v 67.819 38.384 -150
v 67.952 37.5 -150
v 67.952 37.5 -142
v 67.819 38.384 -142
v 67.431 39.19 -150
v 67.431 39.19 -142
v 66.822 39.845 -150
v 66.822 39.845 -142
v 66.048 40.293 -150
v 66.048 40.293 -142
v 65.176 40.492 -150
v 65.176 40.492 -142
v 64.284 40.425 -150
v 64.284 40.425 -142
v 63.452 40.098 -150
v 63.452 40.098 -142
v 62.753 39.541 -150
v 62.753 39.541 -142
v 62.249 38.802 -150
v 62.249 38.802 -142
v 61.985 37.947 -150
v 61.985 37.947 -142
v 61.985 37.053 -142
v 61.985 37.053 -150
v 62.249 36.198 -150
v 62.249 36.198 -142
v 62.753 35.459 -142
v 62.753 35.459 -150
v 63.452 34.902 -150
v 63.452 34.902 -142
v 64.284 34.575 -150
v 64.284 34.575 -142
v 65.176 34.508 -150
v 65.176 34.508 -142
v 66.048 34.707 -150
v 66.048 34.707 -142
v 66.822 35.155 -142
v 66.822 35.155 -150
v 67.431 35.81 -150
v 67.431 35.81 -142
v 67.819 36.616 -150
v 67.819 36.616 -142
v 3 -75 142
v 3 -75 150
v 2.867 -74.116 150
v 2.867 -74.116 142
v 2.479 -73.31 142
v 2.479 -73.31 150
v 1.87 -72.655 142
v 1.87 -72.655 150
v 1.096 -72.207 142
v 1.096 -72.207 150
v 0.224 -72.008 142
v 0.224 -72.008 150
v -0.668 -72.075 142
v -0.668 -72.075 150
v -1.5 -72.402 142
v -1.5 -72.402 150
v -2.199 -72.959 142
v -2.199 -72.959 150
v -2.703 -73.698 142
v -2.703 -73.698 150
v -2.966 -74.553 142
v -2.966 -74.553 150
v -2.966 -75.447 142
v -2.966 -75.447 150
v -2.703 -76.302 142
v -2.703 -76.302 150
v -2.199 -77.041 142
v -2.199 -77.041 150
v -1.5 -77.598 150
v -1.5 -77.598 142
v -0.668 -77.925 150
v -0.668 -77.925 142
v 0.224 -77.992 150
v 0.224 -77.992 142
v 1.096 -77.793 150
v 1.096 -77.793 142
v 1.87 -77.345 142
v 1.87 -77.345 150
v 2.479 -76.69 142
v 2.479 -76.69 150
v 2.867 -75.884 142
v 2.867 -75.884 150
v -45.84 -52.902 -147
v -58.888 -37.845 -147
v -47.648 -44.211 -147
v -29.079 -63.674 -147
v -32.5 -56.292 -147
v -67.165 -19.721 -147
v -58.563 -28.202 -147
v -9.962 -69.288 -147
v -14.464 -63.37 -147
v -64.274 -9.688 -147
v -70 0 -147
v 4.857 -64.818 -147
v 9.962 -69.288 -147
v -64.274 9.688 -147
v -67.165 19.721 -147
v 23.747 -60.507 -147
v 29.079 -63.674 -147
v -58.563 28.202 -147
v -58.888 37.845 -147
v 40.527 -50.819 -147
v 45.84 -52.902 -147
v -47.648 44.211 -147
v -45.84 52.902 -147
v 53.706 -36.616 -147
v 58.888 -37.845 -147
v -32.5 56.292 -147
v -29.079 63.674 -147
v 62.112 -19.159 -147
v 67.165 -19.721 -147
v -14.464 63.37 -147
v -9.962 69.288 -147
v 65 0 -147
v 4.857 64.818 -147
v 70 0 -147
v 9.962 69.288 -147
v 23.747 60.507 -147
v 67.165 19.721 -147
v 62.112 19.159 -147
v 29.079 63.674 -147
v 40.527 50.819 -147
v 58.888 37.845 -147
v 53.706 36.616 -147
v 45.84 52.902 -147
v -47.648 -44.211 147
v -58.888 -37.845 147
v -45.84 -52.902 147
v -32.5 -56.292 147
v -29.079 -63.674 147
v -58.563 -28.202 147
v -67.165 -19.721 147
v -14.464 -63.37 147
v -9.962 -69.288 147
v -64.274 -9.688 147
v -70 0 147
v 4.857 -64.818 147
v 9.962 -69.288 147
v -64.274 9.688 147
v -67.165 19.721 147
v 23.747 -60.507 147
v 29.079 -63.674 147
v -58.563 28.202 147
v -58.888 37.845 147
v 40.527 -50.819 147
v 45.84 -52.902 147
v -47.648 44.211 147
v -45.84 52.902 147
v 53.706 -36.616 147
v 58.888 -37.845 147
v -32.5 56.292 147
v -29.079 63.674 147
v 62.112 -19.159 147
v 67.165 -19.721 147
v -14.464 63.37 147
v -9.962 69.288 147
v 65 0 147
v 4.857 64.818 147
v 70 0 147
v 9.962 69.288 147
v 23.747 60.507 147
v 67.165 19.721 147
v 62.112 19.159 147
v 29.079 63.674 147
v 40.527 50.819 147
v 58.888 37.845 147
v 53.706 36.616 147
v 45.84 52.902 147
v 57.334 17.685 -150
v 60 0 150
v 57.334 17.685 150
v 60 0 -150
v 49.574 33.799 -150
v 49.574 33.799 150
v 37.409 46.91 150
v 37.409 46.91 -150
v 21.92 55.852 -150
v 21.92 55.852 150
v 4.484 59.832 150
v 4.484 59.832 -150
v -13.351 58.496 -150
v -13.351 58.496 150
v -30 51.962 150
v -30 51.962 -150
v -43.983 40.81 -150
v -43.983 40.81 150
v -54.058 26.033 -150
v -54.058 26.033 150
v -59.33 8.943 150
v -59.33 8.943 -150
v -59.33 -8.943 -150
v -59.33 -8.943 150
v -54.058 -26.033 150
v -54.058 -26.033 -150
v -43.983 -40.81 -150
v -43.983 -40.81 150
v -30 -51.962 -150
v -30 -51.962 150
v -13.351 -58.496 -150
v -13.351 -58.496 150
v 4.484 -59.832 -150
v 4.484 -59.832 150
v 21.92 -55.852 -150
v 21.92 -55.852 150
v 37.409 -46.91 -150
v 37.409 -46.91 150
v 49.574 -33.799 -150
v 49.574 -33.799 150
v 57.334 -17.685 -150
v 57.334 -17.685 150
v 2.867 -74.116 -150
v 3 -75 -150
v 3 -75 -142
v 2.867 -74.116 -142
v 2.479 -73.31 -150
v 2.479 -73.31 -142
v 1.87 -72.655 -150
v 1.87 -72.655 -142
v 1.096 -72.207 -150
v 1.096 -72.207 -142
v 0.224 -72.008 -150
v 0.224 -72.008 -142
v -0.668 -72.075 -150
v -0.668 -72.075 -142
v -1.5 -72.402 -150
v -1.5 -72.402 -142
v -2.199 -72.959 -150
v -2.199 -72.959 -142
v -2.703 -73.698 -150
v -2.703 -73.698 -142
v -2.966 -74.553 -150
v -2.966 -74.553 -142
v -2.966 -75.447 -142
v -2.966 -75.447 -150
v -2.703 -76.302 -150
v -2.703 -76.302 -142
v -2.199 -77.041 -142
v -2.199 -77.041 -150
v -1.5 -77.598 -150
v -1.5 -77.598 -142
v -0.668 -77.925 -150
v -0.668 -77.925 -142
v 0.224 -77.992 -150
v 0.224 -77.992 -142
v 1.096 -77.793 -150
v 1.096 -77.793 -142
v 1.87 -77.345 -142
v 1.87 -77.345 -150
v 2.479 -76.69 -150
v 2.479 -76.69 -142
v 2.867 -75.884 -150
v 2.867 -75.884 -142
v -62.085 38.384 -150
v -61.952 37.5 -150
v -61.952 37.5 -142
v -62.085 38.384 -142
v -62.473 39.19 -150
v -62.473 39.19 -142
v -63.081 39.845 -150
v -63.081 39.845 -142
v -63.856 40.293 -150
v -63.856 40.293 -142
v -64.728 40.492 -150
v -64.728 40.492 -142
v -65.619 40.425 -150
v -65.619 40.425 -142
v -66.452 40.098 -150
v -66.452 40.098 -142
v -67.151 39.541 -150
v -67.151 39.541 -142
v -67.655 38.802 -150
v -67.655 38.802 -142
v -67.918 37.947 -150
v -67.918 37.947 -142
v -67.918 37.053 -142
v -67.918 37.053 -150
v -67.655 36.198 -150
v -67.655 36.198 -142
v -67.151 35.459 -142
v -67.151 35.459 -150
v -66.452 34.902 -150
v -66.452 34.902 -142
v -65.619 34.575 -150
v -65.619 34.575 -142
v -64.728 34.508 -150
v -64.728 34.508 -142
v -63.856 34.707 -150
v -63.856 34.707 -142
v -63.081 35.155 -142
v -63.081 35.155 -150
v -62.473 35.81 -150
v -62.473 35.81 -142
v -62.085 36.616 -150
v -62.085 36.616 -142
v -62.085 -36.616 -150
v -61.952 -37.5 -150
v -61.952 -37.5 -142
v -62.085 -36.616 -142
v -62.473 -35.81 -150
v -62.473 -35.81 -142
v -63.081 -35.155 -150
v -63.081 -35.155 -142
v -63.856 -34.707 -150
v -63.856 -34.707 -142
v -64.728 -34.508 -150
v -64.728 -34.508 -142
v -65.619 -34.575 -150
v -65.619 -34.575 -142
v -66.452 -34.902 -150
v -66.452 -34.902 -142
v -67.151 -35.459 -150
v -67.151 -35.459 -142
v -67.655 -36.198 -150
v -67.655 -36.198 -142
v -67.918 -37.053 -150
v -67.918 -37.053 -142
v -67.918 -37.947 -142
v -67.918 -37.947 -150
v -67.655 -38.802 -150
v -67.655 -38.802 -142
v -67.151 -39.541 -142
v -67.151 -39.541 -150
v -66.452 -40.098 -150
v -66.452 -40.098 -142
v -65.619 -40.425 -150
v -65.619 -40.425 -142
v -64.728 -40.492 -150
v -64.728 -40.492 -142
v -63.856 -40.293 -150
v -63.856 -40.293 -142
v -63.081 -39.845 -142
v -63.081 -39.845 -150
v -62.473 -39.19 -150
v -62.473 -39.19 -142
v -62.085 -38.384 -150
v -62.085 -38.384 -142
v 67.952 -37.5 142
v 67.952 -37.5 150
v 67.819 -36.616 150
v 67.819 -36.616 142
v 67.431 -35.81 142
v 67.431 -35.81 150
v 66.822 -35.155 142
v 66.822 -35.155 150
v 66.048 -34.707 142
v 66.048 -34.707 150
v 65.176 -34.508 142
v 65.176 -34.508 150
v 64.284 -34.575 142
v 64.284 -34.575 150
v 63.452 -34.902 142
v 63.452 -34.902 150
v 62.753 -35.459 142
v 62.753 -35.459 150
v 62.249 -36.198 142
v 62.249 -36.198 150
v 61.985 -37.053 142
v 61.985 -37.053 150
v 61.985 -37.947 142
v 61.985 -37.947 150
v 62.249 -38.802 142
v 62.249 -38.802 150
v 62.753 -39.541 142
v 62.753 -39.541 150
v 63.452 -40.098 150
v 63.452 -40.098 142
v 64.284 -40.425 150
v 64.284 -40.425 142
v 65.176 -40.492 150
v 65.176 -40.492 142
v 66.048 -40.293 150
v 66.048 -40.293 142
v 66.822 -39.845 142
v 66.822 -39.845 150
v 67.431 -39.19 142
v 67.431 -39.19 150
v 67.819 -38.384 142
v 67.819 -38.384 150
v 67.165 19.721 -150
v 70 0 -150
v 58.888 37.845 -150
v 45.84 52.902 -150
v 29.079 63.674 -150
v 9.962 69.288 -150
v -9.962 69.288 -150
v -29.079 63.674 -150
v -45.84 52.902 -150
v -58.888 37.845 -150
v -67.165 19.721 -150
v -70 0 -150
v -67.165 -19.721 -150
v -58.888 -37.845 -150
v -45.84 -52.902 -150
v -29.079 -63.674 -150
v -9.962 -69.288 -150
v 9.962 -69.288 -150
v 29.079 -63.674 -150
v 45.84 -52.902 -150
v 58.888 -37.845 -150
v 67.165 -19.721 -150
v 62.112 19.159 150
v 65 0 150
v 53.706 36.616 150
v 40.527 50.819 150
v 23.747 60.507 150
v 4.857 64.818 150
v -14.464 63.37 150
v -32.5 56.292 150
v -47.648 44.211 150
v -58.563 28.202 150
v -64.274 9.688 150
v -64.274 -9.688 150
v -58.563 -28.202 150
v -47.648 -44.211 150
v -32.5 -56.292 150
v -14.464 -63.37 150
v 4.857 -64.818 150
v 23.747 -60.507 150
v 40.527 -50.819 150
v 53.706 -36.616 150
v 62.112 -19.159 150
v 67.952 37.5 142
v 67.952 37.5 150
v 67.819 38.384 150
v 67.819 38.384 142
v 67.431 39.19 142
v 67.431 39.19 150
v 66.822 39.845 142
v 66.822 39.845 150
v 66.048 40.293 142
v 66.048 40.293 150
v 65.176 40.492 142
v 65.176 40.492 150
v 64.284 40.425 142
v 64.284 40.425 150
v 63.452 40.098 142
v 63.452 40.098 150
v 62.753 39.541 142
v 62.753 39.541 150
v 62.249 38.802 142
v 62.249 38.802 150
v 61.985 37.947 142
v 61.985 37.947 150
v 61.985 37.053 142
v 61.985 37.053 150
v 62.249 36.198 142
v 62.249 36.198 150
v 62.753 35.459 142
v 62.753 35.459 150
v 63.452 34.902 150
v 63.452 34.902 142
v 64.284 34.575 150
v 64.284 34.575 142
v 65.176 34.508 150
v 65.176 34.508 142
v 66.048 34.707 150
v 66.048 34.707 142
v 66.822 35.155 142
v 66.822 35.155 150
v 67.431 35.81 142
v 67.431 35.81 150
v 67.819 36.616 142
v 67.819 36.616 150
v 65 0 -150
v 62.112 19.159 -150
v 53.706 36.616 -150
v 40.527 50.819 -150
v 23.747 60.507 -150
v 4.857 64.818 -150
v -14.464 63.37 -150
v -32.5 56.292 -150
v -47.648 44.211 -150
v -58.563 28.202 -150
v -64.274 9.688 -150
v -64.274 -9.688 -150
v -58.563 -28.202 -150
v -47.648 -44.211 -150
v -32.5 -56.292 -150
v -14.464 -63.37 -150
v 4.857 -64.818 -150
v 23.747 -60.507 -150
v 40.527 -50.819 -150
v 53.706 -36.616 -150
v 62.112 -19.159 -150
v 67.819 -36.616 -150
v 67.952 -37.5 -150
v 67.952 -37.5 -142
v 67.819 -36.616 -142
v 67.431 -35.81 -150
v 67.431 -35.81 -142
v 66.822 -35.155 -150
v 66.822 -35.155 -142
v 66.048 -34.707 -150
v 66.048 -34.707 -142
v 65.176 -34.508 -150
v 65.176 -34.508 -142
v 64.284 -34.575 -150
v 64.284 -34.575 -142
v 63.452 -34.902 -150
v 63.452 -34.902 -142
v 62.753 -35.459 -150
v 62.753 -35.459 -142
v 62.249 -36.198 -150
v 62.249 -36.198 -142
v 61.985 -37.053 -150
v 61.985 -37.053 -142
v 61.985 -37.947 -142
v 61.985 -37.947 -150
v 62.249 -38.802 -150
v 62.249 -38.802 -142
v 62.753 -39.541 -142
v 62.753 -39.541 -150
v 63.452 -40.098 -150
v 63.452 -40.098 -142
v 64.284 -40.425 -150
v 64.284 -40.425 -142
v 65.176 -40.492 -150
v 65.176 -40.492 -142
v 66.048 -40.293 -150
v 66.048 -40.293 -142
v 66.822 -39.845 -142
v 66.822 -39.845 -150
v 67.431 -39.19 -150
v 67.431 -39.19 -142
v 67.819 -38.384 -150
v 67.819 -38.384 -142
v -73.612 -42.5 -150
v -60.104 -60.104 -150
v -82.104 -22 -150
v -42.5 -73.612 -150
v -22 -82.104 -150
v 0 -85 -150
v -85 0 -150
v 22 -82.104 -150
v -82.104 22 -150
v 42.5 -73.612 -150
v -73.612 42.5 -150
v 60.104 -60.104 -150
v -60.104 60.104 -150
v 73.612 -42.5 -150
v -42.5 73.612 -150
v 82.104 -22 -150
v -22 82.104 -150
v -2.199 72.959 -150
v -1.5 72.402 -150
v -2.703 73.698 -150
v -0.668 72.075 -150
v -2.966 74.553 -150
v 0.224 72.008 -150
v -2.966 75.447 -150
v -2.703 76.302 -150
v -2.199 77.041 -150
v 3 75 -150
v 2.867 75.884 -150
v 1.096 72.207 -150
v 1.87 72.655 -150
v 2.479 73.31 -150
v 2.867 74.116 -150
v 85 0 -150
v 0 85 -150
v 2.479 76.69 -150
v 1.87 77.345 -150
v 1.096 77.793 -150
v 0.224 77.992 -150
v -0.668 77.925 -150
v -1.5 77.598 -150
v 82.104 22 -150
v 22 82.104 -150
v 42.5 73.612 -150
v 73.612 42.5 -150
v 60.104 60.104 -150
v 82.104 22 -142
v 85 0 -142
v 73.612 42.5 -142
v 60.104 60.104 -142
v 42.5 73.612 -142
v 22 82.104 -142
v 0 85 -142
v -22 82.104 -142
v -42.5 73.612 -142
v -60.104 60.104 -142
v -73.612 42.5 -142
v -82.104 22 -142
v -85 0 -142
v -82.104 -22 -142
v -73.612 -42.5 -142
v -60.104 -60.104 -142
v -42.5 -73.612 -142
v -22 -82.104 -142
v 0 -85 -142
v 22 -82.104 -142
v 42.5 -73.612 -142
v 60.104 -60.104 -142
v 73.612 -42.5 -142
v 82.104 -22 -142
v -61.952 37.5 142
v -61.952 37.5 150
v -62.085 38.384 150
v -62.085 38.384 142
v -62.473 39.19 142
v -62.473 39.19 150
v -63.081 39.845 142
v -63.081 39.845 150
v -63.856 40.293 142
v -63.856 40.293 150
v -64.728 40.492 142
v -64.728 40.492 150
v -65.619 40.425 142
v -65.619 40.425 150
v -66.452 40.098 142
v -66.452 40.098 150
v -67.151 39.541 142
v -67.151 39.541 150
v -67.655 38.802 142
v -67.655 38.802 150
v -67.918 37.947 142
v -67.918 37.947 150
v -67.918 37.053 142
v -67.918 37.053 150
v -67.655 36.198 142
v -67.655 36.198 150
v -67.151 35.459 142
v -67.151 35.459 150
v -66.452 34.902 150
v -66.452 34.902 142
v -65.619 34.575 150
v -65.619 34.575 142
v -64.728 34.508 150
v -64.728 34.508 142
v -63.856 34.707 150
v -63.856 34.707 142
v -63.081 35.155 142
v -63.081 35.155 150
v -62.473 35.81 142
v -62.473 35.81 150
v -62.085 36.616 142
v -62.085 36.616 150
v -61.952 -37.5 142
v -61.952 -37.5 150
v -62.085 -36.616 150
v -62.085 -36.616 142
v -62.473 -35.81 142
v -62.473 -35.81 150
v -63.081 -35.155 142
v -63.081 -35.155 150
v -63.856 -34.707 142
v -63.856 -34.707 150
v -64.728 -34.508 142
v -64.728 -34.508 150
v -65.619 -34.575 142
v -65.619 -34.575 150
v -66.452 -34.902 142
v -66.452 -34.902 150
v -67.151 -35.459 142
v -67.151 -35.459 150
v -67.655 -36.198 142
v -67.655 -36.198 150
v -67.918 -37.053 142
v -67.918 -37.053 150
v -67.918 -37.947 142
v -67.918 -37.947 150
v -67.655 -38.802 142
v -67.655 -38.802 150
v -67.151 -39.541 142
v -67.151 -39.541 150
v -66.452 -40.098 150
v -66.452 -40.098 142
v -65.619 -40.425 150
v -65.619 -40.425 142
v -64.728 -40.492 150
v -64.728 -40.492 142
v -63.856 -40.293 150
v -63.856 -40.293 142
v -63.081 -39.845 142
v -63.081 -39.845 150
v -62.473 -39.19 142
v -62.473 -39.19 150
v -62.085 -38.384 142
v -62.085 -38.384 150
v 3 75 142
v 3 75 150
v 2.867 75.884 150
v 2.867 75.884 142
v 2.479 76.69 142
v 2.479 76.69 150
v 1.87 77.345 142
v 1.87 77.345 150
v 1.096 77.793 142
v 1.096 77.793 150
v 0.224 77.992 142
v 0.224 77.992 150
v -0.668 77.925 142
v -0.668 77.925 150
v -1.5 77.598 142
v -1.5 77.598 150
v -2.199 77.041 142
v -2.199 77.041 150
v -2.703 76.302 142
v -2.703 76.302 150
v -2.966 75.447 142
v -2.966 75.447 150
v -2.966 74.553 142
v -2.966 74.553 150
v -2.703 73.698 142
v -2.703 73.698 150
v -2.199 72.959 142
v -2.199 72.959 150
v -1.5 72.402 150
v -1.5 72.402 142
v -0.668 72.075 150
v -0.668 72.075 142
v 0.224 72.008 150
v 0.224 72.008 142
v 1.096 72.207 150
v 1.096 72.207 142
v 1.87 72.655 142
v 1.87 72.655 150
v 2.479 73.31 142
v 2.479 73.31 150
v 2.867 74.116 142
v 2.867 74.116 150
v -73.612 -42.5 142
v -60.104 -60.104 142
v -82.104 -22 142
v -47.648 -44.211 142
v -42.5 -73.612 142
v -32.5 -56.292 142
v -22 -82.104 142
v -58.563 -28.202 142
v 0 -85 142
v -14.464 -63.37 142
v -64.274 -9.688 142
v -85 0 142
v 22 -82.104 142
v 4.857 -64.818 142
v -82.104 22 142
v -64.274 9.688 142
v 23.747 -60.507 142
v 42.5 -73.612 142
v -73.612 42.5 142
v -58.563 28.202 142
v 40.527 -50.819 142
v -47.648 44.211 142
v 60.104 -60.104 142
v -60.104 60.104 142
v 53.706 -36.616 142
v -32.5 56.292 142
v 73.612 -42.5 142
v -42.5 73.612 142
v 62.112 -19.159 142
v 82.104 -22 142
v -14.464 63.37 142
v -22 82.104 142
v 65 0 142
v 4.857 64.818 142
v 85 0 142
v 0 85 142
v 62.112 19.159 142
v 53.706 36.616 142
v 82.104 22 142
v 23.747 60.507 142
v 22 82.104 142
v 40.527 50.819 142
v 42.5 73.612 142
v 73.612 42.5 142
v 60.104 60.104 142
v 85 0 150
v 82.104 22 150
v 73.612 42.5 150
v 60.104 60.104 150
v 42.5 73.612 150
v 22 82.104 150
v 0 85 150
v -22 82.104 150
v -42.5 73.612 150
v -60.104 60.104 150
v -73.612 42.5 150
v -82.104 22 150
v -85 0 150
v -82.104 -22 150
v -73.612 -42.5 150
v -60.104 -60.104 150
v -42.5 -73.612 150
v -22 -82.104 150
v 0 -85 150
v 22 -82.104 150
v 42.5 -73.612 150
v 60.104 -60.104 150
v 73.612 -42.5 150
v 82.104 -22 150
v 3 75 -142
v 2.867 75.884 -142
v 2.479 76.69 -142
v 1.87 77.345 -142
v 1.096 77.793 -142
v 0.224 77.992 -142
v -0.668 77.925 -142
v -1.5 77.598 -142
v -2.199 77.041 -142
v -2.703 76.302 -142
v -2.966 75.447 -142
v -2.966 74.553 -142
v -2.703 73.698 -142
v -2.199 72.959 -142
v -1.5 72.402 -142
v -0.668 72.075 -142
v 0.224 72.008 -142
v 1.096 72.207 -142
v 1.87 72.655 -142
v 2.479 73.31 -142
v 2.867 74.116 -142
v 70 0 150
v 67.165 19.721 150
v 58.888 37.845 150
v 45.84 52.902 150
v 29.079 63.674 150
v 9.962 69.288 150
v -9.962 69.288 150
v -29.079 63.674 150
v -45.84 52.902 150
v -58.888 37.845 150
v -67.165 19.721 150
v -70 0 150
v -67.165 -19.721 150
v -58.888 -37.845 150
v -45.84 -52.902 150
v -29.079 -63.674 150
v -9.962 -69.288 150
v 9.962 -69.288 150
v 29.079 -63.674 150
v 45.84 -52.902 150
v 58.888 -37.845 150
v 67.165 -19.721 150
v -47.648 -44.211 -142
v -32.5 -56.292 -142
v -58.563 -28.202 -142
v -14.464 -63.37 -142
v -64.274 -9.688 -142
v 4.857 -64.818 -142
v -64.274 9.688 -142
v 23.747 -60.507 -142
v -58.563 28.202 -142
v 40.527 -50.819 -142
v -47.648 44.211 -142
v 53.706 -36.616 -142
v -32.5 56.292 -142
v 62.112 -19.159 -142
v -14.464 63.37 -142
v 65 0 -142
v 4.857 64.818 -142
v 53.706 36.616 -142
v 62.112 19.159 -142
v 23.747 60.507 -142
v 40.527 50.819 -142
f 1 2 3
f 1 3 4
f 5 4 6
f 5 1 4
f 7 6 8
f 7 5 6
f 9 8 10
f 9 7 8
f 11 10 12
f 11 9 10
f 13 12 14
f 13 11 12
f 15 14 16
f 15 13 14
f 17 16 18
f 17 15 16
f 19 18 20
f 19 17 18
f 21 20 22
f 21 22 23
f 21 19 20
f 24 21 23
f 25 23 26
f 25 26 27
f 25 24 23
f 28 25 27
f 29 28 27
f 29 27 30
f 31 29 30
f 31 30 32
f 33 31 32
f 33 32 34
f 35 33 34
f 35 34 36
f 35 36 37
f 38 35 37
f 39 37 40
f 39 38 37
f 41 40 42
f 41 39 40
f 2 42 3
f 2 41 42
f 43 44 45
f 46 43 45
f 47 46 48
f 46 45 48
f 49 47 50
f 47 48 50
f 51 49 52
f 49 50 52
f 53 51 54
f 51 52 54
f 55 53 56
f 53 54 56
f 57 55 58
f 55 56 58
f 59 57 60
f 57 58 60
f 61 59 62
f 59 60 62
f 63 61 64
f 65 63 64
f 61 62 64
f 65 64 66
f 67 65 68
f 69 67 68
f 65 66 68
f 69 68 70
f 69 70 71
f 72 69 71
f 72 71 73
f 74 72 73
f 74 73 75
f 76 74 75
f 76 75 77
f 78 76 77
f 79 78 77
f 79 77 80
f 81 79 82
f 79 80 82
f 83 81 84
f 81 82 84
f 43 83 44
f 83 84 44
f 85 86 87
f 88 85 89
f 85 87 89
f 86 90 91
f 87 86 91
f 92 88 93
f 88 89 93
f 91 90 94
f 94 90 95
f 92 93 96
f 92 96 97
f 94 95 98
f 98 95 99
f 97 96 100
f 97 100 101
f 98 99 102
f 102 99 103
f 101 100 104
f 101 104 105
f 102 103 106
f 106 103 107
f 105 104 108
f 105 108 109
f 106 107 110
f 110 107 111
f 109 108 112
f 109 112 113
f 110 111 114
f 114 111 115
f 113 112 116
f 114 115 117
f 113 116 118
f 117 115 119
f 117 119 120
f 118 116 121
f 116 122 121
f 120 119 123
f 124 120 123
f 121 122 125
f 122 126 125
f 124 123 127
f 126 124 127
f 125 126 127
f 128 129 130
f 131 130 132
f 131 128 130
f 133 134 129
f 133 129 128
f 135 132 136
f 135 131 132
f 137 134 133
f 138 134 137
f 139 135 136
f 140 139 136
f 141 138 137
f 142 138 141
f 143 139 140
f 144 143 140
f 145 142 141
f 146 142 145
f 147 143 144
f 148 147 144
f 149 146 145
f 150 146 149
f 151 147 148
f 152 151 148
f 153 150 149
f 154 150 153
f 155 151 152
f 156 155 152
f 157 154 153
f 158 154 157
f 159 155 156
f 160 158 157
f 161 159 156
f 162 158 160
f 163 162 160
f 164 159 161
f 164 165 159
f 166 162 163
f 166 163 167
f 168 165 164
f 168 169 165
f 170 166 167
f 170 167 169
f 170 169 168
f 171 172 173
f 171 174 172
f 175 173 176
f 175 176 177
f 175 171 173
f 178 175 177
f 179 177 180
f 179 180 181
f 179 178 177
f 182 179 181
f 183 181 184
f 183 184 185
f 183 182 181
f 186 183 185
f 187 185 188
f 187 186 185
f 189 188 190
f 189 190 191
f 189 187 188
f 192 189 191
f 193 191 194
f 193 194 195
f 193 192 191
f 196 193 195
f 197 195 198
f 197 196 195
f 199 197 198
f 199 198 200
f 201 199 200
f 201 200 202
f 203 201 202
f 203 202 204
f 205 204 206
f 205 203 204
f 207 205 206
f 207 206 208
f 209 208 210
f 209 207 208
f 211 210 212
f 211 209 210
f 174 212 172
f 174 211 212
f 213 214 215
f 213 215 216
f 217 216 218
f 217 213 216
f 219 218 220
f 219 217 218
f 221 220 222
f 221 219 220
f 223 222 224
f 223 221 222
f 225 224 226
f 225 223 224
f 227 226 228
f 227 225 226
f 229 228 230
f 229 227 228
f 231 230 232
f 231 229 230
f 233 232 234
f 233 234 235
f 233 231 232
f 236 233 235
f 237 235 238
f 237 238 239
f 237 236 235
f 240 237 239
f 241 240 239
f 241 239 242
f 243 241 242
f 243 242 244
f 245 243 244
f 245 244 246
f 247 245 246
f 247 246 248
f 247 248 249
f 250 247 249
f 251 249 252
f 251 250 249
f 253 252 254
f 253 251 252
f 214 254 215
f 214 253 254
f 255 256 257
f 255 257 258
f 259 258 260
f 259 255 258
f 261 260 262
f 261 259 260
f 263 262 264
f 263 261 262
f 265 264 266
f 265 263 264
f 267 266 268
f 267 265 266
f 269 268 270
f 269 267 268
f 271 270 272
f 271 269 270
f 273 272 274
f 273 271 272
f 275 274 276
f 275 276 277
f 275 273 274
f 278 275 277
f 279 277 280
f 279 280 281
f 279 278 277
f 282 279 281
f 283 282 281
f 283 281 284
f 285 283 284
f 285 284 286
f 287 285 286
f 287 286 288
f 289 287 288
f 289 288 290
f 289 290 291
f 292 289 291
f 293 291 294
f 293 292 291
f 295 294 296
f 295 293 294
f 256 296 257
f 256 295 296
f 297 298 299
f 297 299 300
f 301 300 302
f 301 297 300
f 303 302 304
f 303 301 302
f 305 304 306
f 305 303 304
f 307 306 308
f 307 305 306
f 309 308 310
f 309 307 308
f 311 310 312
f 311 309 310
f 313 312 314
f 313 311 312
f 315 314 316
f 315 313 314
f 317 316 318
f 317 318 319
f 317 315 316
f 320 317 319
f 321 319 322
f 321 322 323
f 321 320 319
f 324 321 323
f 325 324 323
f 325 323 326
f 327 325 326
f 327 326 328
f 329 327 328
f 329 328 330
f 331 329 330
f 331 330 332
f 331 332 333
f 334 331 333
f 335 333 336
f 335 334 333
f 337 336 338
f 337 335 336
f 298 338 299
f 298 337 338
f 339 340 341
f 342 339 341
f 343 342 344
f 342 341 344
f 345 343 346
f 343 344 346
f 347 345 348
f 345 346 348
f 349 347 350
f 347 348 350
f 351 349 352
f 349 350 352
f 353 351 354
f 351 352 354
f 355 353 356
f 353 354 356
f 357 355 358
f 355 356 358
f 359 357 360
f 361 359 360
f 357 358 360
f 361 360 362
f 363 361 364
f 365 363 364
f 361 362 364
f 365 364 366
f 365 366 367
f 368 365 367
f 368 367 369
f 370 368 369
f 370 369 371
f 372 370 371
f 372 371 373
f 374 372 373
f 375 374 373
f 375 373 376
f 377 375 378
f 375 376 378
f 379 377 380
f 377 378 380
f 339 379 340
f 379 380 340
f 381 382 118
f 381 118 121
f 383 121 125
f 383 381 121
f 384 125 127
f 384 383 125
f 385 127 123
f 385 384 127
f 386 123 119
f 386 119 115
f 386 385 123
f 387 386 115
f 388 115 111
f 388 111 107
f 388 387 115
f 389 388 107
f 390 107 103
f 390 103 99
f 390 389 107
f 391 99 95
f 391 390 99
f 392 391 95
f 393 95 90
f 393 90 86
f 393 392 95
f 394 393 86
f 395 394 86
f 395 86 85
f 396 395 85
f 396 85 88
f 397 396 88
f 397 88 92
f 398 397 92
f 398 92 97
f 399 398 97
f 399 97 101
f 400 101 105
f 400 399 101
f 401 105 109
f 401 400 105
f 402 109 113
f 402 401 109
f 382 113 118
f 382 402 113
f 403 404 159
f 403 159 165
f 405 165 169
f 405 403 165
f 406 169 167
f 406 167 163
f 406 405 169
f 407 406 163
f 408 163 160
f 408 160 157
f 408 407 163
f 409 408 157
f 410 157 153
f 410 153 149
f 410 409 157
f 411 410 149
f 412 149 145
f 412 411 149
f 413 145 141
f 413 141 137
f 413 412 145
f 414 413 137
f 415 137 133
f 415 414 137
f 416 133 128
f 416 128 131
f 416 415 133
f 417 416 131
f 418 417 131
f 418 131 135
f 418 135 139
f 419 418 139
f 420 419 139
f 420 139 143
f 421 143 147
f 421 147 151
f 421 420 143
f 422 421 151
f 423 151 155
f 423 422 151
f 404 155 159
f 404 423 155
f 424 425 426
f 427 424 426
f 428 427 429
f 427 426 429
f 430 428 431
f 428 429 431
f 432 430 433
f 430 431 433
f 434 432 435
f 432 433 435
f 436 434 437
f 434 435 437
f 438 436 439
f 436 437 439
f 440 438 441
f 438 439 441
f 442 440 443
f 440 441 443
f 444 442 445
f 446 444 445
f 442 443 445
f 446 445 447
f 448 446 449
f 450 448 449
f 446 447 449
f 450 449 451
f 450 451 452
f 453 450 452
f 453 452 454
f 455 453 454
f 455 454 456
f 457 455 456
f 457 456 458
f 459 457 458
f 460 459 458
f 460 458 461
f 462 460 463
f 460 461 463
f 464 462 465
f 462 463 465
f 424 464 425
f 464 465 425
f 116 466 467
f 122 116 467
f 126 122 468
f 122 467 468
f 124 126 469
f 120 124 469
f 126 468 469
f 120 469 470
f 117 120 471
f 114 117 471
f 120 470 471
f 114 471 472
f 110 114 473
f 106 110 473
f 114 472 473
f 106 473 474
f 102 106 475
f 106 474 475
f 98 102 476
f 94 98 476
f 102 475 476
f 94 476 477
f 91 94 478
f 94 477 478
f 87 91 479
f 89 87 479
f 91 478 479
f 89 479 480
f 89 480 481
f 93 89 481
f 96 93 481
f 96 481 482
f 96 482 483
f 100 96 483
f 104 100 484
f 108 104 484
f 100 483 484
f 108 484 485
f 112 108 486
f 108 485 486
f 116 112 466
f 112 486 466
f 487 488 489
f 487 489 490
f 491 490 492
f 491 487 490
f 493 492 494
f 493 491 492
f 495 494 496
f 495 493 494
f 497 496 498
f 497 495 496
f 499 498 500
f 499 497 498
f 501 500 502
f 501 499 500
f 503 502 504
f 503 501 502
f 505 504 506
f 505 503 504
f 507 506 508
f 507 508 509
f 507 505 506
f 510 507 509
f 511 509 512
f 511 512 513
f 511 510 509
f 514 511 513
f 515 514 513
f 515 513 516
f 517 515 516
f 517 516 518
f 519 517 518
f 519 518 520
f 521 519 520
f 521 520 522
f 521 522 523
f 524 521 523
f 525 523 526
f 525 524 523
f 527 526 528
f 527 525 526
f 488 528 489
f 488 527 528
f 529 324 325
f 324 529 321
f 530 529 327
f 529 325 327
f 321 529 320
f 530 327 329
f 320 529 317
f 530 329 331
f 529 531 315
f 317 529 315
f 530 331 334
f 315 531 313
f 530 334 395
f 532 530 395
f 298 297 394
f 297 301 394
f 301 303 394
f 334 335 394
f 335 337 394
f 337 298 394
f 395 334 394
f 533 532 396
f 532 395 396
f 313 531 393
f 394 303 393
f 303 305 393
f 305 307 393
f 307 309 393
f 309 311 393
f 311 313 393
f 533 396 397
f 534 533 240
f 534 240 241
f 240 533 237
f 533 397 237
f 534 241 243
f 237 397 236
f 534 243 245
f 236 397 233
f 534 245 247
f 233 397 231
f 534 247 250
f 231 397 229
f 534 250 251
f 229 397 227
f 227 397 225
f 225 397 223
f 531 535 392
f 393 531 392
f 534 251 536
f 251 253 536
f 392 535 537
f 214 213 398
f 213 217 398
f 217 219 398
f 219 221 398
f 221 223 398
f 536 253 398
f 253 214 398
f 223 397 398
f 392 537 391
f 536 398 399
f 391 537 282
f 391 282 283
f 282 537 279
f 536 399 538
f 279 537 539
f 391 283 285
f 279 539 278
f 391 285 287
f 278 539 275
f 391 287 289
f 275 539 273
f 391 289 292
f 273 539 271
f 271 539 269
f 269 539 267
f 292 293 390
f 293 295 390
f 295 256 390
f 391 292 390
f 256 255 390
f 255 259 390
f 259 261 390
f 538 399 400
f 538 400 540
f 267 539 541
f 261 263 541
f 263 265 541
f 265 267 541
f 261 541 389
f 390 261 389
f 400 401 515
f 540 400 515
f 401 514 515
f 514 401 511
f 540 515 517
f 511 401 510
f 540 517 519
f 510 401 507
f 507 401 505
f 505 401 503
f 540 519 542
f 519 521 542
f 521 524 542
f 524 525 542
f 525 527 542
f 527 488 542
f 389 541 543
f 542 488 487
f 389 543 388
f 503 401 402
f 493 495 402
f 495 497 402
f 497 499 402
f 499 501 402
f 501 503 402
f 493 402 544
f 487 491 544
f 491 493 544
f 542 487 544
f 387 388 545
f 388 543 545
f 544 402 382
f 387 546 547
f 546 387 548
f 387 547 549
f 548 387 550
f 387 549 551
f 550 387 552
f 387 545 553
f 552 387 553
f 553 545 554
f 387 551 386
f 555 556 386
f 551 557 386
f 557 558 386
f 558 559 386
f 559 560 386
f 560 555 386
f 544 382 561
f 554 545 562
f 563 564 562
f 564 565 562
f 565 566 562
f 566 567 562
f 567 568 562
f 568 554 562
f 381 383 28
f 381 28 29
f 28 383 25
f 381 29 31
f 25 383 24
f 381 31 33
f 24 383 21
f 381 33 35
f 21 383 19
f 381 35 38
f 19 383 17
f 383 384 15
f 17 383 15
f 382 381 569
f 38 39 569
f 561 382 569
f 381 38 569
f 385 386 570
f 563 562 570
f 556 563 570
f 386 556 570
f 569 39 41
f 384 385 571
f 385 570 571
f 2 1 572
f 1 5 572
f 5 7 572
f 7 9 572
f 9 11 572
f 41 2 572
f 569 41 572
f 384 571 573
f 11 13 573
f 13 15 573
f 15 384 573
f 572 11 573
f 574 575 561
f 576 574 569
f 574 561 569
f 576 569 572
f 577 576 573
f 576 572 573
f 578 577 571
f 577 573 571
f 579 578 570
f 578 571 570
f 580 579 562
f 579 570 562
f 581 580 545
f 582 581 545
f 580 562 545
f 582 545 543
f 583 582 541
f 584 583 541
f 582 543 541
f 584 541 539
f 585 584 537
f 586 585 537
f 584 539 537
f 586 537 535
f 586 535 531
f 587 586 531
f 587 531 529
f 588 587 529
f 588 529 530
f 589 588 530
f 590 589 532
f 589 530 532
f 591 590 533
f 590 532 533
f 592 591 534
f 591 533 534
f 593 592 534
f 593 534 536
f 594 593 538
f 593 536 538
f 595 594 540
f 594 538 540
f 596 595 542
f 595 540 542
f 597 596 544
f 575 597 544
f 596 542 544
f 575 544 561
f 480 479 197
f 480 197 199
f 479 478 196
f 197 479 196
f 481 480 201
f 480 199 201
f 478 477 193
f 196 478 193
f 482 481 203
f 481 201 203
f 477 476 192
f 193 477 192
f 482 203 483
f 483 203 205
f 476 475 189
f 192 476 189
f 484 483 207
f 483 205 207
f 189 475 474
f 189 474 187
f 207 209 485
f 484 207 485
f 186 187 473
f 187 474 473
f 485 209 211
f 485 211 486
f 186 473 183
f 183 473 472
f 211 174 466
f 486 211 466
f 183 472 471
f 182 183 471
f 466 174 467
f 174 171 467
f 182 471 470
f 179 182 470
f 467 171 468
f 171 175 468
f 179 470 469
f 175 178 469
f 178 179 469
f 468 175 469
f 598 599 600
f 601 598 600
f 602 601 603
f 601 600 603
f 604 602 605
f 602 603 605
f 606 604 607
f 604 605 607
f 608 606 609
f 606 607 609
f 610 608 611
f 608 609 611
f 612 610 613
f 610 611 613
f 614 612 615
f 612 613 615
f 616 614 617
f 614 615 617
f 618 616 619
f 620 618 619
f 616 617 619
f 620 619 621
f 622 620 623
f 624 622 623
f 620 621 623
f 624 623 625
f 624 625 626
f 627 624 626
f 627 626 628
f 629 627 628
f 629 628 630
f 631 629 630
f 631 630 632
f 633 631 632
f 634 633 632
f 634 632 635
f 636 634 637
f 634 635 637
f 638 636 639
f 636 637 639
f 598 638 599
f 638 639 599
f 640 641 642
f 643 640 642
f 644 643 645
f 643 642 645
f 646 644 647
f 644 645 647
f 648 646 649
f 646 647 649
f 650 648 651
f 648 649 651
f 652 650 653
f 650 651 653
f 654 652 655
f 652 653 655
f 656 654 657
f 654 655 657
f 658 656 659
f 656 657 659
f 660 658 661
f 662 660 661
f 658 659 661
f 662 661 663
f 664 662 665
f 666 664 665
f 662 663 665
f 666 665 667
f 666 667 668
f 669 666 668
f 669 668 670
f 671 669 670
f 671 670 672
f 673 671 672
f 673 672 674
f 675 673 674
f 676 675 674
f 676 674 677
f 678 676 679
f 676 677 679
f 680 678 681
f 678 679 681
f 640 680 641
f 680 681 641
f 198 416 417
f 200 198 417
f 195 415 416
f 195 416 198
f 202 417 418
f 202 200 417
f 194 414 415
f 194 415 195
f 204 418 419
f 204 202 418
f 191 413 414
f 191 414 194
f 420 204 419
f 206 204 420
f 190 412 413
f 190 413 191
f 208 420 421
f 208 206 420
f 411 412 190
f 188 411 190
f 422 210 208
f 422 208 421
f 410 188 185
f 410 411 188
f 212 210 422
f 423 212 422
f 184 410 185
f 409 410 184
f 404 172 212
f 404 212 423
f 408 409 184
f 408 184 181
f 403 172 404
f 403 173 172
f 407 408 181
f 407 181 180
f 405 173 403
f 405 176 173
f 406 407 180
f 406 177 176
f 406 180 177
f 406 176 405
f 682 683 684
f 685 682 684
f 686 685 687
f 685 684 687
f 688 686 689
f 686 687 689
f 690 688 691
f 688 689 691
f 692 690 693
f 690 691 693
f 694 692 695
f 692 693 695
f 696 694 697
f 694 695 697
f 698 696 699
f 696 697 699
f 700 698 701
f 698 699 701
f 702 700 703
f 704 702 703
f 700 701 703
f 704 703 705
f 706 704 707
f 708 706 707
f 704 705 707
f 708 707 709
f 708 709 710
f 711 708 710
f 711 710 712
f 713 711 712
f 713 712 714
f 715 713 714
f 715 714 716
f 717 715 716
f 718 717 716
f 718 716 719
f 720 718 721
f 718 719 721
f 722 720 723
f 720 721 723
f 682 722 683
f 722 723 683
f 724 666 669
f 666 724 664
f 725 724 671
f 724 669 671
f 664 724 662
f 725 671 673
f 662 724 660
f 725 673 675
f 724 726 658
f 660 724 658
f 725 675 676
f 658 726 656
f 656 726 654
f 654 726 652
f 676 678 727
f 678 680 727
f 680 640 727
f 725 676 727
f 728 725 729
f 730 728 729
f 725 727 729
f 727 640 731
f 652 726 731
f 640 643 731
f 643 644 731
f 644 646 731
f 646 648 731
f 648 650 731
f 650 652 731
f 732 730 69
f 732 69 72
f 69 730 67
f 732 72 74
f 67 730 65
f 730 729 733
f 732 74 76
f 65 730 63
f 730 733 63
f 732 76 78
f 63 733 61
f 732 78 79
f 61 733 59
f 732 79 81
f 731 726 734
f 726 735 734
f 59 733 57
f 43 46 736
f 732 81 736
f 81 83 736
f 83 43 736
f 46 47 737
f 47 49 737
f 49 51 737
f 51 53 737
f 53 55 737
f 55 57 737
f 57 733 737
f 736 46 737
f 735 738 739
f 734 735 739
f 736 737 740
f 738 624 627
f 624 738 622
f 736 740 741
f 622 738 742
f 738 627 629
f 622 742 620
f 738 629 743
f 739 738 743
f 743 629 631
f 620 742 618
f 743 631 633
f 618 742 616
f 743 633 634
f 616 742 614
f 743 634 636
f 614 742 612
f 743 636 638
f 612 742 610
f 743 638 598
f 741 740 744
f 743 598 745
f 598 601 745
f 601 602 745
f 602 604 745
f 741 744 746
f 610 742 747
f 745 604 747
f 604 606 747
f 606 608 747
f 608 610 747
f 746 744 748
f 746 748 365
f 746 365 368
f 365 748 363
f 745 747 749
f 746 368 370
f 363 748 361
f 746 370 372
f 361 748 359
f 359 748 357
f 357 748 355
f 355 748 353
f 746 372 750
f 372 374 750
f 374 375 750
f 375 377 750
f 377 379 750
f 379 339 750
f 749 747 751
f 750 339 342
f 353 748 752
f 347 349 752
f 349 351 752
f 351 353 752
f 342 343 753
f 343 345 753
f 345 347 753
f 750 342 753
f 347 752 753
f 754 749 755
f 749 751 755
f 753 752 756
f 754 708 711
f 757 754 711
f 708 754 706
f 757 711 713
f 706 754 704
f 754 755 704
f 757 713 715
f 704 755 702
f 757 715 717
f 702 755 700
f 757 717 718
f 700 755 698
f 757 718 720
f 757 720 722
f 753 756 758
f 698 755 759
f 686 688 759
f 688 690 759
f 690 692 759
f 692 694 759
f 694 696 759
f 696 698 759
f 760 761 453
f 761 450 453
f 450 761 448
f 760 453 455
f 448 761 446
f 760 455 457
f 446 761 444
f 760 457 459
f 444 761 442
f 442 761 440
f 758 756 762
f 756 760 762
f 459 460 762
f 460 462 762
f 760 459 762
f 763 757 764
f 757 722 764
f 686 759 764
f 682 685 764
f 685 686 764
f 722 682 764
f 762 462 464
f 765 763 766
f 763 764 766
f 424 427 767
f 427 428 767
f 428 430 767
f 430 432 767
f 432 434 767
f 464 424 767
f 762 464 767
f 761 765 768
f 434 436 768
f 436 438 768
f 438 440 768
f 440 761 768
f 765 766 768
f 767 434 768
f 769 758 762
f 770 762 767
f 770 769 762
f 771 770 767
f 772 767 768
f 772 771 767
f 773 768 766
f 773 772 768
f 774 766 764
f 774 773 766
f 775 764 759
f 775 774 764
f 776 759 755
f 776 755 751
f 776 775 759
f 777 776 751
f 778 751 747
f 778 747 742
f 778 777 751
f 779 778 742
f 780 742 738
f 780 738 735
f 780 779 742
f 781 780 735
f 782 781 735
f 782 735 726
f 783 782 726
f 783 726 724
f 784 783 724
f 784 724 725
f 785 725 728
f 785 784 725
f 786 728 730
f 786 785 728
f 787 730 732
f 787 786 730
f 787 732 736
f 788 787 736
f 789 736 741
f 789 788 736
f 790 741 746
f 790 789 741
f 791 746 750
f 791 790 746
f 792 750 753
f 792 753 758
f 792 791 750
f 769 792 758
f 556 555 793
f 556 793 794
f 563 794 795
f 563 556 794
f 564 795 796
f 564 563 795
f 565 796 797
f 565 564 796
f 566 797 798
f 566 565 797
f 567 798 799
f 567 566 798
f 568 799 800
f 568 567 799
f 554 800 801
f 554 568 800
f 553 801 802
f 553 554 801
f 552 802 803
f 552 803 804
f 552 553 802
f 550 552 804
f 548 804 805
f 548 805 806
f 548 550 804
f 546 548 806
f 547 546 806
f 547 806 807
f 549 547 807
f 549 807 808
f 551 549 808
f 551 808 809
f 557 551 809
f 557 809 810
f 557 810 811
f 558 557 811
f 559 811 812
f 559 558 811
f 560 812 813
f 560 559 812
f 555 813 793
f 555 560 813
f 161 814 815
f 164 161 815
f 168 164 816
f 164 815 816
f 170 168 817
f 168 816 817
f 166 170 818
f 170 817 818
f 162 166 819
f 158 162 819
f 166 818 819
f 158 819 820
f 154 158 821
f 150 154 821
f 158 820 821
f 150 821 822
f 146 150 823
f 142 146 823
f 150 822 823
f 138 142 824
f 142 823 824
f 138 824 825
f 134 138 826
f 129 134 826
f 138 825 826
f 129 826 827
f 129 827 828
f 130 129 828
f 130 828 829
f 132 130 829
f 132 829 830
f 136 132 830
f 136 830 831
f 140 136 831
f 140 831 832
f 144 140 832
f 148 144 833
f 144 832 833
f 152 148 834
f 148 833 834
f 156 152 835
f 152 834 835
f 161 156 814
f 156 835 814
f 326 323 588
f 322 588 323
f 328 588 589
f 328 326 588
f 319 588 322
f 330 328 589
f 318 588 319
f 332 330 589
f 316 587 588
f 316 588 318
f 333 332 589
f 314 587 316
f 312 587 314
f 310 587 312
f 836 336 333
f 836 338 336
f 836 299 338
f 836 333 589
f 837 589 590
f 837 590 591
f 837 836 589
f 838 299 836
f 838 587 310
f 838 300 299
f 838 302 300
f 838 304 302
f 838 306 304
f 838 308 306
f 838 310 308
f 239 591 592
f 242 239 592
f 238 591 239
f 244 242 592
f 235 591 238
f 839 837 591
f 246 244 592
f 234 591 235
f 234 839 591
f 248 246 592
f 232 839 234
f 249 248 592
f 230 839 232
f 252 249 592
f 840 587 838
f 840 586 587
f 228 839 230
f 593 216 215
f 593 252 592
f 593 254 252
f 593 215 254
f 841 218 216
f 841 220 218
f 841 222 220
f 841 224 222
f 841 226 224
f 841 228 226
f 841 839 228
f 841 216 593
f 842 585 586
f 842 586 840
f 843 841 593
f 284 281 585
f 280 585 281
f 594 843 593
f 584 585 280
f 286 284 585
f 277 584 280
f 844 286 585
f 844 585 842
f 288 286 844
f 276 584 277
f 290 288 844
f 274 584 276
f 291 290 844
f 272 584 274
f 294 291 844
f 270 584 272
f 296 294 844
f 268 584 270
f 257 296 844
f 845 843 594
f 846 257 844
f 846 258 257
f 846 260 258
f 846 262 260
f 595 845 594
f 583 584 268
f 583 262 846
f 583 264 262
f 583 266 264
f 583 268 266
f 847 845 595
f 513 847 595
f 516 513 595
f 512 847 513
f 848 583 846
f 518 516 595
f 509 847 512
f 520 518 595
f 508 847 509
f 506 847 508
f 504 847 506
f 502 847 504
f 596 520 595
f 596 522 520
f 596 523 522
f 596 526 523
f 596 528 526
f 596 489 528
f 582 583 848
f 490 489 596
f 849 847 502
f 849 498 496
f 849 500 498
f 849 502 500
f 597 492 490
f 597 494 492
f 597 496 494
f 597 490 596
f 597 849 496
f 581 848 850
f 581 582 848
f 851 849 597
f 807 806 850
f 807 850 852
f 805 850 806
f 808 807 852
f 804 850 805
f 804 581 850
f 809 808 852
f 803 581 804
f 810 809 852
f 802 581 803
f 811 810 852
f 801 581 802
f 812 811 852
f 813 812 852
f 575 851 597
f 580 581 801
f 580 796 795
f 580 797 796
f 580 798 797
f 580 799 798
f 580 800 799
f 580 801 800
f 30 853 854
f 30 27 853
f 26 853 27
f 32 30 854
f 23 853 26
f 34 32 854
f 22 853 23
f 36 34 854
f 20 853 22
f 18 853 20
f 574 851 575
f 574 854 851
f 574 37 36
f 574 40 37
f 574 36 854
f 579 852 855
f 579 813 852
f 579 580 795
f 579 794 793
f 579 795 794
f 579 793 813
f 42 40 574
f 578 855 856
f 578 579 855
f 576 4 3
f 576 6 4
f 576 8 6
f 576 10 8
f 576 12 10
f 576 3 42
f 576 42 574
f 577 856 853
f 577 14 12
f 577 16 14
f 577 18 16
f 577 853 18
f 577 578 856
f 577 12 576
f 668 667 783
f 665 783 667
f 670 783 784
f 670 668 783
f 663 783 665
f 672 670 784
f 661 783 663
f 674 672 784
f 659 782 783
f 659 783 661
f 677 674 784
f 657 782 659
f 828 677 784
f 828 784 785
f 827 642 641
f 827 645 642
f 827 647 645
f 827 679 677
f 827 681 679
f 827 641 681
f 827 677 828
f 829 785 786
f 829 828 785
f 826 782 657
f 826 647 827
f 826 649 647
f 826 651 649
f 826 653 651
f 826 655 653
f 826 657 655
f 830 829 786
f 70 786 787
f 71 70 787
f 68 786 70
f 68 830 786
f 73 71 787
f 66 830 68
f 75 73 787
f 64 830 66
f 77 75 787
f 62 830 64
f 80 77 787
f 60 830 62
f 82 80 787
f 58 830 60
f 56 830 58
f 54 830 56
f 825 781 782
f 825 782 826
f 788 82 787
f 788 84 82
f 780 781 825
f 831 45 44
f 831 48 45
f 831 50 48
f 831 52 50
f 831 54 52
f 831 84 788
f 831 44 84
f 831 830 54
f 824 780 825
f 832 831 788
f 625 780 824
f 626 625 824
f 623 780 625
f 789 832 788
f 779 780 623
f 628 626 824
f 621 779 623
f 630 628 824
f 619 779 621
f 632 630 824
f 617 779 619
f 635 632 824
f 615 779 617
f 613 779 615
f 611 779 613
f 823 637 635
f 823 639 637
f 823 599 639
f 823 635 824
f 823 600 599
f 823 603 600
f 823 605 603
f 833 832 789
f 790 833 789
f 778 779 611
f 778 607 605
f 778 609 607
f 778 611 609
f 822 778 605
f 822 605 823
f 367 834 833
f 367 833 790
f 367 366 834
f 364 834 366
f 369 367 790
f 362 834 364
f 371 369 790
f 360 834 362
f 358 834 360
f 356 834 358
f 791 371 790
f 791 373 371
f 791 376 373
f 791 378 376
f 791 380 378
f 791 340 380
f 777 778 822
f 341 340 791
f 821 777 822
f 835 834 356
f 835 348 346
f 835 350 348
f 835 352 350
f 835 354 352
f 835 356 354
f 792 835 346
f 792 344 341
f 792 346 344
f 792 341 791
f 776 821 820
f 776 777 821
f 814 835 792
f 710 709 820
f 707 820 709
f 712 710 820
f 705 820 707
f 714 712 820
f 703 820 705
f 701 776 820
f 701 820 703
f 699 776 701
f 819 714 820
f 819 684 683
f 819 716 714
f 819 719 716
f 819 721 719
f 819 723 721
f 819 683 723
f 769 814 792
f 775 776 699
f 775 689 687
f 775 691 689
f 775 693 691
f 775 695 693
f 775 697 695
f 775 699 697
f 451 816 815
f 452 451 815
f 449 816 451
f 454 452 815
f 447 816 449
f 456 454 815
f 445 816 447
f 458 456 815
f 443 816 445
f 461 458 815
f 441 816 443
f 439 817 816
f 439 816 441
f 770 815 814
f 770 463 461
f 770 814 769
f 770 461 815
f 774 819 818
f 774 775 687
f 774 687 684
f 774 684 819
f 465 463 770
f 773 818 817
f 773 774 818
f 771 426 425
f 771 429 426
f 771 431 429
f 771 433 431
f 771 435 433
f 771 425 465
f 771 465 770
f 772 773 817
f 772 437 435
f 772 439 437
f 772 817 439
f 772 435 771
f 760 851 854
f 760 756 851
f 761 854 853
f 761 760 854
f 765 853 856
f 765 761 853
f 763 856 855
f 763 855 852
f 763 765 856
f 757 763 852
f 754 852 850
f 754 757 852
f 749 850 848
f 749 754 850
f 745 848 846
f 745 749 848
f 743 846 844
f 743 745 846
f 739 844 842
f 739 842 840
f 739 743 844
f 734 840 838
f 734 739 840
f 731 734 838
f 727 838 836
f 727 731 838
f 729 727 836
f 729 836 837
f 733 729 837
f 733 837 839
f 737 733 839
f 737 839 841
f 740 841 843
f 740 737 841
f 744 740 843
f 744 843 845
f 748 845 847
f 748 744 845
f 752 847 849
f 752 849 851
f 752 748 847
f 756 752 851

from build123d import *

# Parameters (mm, degrees)
SKETCH_1_R          = 65
SKETCH_1_R_2        = 60
EXTRUDE_1_DEPTH     = 150
SKETCH_2_R          = 85
SKETCH_2_R_2        = 3
SKETCH_2_R_3        = 65
EXTRUDE_2_DEPTH     = 8
SKETCH_3_R          = 70
SKETCH_3_R_2        = 65
CUT_EXTRUDE_1_DEPTH = 3


with BuildPart() as part:
    # 草图1 → 凸台-拉伸1 (new, symmetric)
    with BuildSketch(Plane.XY):
        Circle(SKETCH_1_R)
        Circle(SKETCH_1_R_2, mode=Mode.SUBTRACT)
    extrude(amount=EXTRUDE_1_DEPTH, both=True)

    # 草图2 → 凸台-拉伸2 (add)
    with BuildSketch(Plane.XY.offset(150)):
        Circle(SKETCH_2_R)
        with Locations((0, 75)):
            Circle(SKETCH_2_R_2, mode=Mode.SUBTRACT)
        with Locations((64.951905284, 37.5)):
            Circle(SKETCH_2_R_2, mode=Mode.SUBTRACT)
        with Locations((64.951905284, -37.5)):
            Circle(SKETCH_2_R_2, mode=Mode.SUBTRACT)
        with Locations((0, -75)):
            Circle(SKETCH_2_R_2, mode=Mode.SUBTRACT)
        with Locations((-64.951905284, -37.5)):
            Circle(SKETCH_2_R_2, mode=Mode.SUBTRACT)
        with Locations((-64.951905284, 37.5)):
            Circle(SKETCH_2_R_2, mode=Mode.SUBTRACT)
        Circle(SKETCH_2_R_3, mode=Mode.SUBTRACT)
    extrude_2 = extrude(amount=-EXTRUDE_2_DEPTH)

    # 草图3 → 切除-拉伸1 (cut)
    with BuildSketch(Plane.XY.offset(150)):
        Circle(SKETCH_3_R)
        Circle(SKETCH_3_R_2, mode=Mode.SUBTRACT)
    cut_extrude_1 = extrude(amount=-CUT_EXTRUDE_1_DEPTH, mode=Mode.SUBTRACT)

    # 镜向1: 凸台-拉伸2, 切除-拉伸1 across plane
    add(extrude_2.mirror(Plane.XY))
    add(cut_extrude_1.mirror(Plane.XY), mode=Mode.SUBTRACT)


solid = part.part
